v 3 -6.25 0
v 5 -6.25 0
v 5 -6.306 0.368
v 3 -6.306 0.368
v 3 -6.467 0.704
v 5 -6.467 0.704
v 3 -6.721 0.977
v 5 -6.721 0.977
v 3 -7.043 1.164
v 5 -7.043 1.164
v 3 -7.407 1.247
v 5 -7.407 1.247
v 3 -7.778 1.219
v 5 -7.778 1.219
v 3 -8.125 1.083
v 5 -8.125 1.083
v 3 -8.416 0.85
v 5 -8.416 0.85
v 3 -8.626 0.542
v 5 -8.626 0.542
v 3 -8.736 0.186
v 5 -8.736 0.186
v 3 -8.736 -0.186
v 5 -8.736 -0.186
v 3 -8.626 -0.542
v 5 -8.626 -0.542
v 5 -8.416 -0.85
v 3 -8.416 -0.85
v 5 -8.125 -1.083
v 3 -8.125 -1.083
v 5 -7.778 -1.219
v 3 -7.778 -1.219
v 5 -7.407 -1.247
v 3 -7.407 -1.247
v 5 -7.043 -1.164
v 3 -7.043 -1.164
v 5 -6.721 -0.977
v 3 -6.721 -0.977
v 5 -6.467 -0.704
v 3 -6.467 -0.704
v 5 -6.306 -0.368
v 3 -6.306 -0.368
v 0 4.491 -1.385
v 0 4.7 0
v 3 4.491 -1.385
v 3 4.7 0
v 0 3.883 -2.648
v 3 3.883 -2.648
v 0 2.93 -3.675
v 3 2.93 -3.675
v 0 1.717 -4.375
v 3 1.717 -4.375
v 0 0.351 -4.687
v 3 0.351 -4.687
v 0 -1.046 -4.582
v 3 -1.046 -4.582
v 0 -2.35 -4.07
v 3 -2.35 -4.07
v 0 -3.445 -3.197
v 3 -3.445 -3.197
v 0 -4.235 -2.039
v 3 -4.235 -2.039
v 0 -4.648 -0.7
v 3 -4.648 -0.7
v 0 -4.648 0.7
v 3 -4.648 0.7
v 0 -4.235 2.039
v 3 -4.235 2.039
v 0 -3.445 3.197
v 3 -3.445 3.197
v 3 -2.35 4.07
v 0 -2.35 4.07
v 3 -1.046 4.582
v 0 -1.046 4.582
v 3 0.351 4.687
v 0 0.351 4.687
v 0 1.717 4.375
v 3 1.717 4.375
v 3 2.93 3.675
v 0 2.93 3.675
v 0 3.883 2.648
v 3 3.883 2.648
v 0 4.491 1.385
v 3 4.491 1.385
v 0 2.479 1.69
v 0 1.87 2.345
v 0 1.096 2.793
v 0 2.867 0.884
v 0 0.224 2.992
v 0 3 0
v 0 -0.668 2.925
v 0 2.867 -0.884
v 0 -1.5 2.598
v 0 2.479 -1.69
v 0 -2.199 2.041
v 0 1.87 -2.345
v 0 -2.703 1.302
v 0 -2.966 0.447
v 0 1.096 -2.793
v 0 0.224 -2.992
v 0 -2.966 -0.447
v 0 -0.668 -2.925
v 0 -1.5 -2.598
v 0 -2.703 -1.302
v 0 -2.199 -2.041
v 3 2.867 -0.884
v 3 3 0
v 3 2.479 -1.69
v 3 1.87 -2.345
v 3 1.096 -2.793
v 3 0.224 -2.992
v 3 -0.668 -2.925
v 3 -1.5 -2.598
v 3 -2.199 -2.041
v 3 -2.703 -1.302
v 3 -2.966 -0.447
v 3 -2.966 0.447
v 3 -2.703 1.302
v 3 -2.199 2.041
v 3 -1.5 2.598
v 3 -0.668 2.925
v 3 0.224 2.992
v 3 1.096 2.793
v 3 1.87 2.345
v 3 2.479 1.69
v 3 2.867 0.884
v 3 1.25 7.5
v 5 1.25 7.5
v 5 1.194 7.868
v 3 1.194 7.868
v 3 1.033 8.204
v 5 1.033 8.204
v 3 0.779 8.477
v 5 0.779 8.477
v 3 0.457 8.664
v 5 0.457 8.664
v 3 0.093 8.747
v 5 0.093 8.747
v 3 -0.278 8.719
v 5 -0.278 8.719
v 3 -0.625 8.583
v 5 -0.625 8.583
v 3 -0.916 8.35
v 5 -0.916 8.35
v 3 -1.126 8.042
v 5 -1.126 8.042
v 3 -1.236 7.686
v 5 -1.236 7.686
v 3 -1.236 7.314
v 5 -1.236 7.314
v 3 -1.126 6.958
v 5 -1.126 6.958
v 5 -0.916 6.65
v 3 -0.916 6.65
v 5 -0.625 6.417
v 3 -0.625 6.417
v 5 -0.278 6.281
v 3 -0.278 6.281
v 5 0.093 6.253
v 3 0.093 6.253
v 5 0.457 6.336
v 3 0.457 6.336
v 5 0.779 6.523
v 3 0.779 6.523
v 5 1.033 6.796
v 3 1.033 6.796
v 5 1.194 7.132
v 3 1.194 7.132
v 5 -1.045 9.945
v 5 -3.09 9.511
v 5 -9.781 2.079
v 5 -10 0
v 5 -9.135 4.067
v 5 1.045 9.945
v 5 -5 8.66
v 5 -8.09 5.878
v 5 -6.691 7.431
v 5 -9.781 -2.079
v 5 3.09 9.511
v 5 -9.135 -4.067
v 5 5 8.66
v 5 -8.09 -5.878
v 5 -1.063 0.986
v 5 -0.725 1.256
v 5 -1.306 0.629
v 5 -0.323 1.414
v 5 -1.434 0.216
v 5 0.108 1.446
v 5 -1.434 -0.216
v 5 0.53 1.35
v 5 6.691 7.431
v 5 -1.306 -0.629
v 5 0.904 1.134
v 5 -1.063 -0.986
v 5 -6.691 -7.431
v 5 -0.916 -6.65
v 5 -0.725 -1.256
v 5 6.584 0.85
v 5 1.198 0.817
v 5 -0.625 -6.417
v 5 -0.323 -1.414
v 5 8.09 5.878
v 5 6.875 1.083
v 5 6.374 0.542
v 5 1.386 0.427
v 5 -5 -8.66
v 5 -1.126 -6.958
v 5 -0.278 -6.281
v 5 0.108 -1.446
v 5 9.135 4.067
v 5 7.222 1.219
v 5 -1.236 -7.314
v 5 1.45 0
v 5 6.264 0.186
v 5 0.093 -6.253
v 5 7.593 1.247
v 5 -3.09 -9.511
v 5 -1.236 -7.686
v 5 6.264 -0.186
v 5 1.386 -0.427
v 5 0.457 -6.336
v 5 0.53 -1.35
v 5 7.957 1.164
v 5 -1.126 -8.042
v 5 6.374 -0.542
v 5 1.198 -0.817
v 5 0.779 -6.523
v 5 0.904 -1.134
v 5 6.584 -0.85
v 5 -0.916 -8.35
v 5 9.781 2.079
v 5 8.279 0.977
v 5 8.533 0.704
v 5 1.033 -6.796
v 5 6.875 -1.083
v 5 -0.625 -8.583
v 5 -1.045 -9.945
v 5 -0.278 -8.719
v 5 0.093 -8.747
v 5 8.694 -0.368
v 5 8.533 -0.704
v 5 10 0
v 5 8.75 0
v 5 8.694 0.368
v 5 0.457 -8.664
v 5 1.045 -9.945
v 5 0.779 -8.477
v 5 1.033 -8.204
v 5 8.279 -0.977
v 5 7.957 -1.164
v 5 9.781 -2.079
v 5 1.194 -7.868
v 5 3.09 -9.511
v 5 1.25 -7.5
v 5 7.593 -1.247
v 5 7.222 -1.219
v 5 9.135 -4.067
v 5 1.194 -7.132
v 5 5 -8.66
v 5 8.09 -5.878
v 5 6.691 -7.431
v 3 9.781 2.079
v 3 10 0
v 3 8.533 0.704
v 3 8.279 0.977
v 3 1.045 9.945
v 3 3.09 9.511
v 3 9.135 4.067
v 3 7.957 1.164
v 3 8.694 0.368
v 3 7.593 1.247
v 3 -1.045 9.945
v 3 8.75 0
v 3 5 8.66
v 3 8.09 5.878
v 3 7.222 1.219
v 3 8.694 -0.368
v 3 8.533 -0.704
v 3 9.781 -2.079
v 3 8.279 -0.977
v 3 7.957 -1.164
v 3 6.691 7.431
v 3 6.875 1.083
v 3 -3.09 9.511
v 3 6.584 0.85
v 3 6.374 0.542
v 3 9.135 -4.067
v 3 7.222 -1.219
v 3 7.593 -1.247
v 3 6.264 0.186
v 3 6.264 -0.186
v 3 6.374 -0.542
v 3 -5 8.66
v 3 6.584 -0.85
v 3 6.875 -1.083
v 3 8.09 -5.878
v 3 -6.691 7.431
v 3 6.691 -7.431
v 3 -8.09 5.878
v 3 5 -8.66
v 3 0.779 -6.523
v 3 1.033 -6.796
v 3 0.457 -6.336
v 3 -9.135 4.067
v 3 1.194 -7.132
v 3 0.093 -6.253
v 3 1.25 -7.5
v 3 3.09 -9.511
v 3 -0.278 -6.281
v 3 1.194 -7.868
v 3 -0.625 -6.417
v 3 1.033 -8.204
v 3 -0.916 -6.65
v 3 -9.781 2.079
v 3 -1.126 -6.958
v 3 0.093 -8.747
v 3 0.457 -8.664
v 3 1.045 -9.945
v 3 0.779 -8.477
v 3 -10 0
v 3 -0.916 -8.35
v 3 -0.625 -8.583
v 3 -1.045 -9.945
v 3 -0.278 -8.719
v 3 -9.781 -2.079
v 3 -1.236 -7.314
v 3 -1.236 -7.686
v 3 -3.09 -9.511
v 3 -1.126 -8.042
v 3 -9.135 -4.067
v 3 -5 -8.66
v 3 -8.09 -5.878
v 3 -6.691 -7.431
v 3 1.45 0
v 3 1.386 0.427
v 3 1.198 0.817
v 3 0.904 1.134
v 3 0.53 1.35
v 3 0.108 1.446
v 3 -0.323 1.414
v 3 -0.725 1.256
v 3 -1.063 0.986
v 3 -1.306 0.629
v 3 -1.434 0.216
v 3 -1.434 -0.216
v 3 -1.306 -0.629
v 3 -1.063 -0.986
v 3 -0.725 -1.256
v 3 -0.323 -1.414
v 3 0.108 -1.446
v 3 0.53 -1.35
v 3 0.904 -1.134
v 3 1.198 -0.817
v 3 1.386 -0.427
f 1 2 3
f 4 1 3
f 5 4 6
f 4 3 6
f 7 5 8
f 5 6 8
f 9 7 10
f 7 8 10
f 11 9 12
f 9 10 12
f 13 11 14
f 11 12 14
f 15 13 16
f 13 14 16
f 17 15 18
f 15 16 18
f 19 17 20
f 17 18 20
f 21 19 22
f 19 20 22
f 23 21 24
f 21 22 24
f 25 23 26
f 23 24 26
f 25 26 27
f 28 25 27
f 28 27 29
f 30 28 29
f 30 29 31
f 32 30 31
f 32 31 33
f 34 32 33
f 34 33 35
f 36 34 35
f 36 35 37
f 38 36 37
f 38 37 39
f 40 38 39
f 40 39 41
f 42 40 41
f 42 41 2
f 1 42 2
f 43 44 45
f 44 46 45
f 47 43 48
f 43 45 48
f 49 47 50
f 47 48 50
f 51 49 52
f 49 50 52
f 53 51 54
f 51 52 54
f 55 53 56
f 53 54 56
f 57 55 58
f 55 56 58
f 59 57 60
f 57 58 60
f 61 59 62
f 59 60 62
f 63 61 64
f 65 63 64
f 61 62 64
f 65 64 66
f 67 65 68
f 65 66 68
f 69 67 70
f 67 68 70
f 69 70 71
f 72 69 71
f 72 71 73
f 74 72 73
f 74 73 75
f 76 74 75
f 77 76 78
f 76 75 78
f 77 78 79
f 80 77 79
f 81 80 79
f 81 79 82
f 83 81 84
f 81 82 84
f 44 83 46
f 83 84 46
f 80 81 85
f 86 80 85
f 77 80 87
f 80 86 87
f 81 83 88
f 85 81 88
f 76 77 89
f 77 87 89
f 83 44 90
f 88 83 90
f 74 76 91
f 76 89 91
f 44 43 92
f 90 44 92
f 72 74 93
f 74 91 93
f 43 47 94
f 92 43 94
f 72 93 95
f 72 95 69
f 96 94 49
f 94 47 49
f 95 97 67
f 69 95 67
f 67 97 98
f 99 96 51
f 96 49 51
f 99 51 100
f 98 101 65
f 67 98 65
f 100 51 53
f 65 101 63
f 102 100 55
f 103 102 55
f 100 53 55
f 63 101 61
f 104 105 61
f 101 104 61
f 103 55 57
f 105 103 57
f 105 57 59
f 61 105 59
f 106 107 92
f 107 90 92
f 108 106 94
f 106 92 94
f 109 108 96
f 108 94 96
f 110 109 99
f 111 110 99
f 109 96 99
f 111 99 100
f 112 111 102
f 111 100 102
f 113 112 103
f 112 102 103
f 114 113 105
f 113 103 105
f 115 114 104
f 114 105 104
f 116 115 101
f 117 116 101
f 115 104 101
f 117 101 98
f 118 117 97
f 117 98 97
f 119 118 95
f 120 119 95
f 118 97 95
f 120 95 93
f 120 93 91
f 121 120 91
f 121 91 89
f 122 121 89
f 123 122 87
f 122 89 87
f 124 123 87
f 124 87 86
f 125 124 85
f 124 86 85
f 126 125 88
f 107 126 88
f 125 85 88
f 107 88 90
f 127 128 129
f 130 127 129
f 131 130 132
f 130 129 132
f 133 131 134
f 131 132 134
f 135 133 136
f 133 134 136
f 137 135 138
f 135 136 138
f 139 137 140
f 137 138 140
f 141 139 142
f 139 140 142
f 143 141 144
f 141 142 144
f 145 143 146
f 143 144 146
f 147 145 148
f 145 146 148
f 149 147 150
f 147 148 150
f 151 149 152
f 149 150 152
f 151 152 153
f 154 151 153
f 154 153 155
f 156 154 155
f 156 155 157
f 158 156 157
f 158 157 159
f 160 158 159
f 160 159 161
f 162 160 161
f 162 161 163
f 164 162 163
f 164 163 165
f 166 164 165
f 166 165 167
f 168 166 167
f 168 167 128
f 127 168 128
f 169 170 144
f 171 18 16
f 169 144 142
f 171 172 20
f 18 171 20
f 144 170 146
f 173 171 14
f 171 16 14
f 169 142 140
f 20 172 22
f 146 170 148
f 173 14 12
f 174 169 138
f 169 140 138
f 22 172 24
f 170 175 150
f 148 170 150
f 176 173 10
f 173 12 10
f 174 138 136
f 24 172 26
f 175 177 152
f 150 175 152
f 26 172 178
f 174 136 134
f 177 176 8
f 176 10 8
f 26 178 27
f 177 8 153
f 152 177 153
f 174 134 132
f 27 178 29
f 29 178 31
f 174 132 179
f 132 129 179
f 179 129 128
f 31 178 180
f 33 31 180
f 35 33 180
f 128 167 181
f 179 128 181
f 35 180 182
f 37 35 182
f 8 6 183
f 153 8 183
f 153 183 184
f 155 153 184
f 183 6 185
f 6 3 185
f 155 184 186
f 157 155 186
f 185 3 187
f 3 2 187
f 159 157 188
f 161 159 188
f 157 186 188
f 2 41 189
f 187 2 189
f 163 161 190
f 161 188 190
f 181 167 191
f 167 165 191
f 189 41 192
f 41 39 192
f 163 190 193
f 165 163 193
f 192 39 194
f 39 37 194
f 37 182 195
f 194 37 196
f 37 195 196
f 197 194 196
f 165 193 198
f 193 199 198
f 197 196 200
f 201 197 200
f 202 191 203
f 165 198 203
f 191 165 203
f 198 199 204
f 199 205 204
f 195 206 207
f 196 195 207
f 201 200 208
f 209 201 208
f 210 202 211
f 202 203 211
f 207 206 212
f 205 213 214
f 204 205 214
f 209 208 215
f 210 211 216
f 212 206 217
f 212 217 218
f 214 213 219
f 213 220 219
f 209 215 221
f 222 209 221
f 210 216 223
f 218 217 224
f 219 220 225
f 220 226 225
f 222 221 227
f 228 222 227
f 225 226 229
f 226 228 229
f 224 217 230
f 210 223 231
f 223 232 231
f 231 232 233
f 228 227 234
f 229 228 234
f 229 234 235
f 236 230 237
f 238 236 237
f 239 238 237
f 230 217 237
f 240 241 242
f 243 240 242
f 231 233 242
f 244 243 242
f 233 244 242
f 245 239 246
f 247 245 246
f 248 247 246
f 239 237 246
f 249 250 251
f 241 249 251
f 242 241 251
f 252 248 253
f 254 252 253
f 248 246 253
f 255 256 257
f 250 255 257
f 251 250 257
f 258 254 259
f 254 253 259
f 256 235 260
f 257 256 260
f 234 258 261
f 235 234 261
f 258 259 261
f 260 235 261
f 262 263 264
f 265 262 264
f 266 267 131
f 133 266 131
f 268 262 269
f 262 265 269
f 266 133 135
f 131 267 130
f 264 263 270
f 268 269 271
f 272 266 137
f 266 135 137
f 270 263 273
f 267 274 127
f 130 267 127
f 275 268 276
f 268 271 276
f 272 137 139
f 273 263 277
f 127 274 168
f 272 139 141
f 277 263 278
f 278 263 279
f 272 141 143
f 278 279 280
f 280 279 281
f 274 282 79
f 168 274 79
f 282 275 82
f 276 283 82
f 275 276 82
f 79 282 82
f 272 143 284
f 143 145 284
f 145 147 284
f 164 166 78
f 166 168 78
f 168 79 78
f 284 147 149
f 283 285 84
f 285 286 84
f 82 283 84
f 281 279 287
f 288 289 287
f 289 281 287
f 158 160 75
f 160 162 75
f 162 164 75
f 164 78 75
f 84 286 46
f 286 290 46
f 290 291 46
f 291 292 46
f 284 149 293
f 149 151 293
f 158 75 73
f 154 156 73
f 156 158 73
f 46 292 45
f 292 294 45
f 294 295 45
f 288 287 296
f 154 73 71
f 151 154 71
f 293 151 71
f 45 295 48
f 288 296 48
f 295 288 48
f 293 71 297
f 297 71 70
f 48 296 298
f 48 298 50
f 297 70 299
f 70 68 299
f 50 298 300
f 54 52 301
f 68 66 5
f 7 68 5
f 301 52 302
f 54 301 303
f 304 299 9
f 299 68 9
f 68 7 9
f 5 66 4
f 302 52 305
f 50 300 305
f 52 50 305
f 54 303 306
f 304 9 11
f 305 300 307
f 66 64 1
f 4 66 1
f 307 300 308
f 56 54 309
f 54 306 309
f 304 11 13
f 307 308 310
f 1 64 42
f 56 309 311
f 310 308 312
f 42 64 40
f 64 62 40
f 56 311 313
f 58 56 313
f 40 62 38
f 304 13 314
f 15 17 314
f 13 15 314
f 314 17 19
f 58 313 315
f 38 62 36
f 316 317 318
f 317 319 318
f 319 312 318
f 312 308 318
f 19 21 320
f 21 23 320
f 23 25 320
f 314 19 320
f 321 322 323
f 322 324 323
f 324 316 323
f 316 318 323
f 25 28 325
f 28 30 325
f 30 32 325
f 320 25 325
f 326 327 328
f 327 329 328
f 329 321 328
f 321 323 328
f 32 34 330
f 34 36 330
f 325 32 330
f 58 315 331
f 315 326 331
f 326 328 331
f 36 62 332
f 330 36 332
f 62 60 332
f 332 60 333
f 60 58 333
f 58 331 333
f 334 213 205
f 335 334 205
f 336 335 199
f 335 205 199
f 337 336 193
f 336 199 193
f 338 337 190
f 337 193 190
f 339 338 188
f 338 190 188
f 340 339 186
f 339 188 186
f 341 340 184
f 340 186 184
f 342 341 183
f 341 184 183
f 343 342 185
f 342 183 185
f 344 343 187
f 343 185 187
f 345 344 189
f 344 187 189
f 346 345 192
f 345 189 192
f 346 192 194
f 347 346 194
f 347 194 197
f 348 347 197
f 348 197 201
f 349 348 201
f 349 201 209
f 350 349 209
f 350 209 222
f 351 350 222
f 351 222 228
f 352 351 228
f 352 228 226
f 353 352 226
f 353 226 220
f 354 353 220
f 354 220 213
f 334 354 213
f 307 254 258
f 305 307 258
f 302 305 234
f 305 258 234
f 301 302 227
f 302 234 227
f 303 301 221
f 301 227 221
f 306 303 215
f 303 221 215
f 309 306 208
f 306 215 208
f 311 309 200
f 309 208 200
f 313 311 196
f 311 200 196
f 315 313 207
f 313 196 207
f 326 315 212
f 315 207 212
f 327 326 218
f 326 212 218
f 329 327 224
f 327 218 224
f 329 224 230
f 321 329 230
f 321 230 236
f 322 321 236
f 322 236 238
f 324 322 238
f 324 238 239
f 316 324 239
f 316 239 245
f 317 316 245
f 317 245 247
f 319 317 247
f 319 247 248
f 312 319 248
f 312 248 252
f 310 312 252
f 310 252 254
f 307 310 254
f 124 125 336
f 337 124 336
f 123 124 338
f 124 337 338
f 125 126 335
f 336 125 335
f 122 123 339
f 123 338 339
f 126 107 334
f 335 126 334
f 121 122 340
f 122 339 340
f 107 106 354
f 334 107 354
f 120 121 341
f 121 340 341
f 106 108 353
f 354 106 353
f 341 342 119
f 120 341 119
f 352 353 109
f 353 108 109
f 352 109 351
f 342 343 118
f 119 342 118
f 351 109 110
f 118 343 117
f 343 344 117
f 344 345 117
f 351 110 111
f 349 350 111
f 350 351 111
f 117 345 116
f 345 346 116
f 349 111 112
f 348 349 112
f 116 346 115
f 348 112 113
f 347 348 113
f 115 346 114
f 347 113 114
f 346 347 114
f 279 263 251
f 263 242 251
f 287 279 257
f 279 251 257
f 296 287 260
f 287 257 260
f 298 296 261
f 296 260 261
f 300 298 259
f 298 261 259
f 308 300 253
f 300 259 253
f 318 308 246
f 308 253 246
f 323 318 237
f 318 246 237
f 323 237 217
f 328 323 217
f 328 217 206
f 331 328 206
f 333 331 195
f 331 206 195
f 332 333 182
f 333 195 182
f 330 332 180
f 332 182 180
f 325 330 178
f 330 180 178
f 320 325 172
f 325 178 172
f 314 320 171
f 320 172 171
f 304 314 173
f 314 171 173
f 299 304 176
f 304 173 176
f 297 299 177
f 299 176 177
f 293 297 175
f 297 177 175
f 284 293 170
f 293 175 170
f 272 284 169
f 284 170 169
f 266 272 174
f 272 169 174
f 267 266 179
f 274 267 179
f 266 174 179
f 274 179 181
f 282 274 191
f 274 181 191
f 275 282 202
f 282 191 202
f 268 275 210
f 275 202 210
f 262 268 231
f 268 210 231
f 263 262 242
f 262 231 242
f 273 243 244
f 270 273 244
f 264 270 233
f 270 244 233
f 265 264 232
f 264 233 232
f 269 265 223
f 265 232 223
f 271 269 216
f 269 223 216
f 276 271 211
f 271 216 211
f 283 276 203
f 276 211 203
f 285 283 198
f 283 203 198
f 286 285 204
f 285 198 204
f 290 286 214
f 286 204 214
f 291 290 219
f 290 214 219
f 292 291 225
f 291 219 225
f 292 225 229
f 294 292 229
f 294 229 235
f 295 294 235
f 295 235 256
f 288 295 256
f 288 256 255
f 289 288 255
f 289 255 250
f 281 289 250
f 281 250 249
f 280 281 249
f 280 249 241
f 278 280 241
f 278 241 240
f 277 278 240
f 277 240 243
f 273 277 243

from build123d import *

# Parameters (mm, degrees)
ESQUISSE2_R             = 1.45
ESQUISSE2_R_2           = 1.25
ENL_V_MAT_EXTRU_1_DEPTH = 10


with BuildPart() as part:
    # Esquisse1 → Révolution1 (revolve)
    with BuildSketch(Plane.XY):
        Polygon((0, 3), (0, 4.7), (3, 4.7), (3, 10), (5, 10), (5, 0), (3, 0), (3, 3), align=None)
    revolve(axis=Axis((5, 0, 0), (-1, 0, 0)))

    # Esquisse2 → Enlèv. mat.-Extru.1 (cut)
    with BuildSketch(Plane(origin=(5, 0, 0), x_dir=(0, 0, -1), z_dir=(1, 0, 0))):
        with Locations(Location((0, 0, 0), (0, 0, 90))):
            Circle(ESQUISSE2_R)
        with Locations(Location((0, 7.5, 0), (0, 0, 90))):
            Circle(ESQUISSE2_R_2)
        with Locations(Location((7.5, 0, 0), (0, 0, 90))):
            Circle(ESQUISSE2_R_2)
        with Locations(Location((0, -7.5, 0), (0, 0, 90))):
            Circle(ESQUISSE2_R_2)
        with Locations(Location((-7.5, 0, 0), (0, 0, 90))):
            Circle(ESQUISSE2_R_2)
    extrude(amount=-ENL_V_MAT_EXTRU_1_DEPTH, mode=Mode.SUBTRACT)


solid = part.part
